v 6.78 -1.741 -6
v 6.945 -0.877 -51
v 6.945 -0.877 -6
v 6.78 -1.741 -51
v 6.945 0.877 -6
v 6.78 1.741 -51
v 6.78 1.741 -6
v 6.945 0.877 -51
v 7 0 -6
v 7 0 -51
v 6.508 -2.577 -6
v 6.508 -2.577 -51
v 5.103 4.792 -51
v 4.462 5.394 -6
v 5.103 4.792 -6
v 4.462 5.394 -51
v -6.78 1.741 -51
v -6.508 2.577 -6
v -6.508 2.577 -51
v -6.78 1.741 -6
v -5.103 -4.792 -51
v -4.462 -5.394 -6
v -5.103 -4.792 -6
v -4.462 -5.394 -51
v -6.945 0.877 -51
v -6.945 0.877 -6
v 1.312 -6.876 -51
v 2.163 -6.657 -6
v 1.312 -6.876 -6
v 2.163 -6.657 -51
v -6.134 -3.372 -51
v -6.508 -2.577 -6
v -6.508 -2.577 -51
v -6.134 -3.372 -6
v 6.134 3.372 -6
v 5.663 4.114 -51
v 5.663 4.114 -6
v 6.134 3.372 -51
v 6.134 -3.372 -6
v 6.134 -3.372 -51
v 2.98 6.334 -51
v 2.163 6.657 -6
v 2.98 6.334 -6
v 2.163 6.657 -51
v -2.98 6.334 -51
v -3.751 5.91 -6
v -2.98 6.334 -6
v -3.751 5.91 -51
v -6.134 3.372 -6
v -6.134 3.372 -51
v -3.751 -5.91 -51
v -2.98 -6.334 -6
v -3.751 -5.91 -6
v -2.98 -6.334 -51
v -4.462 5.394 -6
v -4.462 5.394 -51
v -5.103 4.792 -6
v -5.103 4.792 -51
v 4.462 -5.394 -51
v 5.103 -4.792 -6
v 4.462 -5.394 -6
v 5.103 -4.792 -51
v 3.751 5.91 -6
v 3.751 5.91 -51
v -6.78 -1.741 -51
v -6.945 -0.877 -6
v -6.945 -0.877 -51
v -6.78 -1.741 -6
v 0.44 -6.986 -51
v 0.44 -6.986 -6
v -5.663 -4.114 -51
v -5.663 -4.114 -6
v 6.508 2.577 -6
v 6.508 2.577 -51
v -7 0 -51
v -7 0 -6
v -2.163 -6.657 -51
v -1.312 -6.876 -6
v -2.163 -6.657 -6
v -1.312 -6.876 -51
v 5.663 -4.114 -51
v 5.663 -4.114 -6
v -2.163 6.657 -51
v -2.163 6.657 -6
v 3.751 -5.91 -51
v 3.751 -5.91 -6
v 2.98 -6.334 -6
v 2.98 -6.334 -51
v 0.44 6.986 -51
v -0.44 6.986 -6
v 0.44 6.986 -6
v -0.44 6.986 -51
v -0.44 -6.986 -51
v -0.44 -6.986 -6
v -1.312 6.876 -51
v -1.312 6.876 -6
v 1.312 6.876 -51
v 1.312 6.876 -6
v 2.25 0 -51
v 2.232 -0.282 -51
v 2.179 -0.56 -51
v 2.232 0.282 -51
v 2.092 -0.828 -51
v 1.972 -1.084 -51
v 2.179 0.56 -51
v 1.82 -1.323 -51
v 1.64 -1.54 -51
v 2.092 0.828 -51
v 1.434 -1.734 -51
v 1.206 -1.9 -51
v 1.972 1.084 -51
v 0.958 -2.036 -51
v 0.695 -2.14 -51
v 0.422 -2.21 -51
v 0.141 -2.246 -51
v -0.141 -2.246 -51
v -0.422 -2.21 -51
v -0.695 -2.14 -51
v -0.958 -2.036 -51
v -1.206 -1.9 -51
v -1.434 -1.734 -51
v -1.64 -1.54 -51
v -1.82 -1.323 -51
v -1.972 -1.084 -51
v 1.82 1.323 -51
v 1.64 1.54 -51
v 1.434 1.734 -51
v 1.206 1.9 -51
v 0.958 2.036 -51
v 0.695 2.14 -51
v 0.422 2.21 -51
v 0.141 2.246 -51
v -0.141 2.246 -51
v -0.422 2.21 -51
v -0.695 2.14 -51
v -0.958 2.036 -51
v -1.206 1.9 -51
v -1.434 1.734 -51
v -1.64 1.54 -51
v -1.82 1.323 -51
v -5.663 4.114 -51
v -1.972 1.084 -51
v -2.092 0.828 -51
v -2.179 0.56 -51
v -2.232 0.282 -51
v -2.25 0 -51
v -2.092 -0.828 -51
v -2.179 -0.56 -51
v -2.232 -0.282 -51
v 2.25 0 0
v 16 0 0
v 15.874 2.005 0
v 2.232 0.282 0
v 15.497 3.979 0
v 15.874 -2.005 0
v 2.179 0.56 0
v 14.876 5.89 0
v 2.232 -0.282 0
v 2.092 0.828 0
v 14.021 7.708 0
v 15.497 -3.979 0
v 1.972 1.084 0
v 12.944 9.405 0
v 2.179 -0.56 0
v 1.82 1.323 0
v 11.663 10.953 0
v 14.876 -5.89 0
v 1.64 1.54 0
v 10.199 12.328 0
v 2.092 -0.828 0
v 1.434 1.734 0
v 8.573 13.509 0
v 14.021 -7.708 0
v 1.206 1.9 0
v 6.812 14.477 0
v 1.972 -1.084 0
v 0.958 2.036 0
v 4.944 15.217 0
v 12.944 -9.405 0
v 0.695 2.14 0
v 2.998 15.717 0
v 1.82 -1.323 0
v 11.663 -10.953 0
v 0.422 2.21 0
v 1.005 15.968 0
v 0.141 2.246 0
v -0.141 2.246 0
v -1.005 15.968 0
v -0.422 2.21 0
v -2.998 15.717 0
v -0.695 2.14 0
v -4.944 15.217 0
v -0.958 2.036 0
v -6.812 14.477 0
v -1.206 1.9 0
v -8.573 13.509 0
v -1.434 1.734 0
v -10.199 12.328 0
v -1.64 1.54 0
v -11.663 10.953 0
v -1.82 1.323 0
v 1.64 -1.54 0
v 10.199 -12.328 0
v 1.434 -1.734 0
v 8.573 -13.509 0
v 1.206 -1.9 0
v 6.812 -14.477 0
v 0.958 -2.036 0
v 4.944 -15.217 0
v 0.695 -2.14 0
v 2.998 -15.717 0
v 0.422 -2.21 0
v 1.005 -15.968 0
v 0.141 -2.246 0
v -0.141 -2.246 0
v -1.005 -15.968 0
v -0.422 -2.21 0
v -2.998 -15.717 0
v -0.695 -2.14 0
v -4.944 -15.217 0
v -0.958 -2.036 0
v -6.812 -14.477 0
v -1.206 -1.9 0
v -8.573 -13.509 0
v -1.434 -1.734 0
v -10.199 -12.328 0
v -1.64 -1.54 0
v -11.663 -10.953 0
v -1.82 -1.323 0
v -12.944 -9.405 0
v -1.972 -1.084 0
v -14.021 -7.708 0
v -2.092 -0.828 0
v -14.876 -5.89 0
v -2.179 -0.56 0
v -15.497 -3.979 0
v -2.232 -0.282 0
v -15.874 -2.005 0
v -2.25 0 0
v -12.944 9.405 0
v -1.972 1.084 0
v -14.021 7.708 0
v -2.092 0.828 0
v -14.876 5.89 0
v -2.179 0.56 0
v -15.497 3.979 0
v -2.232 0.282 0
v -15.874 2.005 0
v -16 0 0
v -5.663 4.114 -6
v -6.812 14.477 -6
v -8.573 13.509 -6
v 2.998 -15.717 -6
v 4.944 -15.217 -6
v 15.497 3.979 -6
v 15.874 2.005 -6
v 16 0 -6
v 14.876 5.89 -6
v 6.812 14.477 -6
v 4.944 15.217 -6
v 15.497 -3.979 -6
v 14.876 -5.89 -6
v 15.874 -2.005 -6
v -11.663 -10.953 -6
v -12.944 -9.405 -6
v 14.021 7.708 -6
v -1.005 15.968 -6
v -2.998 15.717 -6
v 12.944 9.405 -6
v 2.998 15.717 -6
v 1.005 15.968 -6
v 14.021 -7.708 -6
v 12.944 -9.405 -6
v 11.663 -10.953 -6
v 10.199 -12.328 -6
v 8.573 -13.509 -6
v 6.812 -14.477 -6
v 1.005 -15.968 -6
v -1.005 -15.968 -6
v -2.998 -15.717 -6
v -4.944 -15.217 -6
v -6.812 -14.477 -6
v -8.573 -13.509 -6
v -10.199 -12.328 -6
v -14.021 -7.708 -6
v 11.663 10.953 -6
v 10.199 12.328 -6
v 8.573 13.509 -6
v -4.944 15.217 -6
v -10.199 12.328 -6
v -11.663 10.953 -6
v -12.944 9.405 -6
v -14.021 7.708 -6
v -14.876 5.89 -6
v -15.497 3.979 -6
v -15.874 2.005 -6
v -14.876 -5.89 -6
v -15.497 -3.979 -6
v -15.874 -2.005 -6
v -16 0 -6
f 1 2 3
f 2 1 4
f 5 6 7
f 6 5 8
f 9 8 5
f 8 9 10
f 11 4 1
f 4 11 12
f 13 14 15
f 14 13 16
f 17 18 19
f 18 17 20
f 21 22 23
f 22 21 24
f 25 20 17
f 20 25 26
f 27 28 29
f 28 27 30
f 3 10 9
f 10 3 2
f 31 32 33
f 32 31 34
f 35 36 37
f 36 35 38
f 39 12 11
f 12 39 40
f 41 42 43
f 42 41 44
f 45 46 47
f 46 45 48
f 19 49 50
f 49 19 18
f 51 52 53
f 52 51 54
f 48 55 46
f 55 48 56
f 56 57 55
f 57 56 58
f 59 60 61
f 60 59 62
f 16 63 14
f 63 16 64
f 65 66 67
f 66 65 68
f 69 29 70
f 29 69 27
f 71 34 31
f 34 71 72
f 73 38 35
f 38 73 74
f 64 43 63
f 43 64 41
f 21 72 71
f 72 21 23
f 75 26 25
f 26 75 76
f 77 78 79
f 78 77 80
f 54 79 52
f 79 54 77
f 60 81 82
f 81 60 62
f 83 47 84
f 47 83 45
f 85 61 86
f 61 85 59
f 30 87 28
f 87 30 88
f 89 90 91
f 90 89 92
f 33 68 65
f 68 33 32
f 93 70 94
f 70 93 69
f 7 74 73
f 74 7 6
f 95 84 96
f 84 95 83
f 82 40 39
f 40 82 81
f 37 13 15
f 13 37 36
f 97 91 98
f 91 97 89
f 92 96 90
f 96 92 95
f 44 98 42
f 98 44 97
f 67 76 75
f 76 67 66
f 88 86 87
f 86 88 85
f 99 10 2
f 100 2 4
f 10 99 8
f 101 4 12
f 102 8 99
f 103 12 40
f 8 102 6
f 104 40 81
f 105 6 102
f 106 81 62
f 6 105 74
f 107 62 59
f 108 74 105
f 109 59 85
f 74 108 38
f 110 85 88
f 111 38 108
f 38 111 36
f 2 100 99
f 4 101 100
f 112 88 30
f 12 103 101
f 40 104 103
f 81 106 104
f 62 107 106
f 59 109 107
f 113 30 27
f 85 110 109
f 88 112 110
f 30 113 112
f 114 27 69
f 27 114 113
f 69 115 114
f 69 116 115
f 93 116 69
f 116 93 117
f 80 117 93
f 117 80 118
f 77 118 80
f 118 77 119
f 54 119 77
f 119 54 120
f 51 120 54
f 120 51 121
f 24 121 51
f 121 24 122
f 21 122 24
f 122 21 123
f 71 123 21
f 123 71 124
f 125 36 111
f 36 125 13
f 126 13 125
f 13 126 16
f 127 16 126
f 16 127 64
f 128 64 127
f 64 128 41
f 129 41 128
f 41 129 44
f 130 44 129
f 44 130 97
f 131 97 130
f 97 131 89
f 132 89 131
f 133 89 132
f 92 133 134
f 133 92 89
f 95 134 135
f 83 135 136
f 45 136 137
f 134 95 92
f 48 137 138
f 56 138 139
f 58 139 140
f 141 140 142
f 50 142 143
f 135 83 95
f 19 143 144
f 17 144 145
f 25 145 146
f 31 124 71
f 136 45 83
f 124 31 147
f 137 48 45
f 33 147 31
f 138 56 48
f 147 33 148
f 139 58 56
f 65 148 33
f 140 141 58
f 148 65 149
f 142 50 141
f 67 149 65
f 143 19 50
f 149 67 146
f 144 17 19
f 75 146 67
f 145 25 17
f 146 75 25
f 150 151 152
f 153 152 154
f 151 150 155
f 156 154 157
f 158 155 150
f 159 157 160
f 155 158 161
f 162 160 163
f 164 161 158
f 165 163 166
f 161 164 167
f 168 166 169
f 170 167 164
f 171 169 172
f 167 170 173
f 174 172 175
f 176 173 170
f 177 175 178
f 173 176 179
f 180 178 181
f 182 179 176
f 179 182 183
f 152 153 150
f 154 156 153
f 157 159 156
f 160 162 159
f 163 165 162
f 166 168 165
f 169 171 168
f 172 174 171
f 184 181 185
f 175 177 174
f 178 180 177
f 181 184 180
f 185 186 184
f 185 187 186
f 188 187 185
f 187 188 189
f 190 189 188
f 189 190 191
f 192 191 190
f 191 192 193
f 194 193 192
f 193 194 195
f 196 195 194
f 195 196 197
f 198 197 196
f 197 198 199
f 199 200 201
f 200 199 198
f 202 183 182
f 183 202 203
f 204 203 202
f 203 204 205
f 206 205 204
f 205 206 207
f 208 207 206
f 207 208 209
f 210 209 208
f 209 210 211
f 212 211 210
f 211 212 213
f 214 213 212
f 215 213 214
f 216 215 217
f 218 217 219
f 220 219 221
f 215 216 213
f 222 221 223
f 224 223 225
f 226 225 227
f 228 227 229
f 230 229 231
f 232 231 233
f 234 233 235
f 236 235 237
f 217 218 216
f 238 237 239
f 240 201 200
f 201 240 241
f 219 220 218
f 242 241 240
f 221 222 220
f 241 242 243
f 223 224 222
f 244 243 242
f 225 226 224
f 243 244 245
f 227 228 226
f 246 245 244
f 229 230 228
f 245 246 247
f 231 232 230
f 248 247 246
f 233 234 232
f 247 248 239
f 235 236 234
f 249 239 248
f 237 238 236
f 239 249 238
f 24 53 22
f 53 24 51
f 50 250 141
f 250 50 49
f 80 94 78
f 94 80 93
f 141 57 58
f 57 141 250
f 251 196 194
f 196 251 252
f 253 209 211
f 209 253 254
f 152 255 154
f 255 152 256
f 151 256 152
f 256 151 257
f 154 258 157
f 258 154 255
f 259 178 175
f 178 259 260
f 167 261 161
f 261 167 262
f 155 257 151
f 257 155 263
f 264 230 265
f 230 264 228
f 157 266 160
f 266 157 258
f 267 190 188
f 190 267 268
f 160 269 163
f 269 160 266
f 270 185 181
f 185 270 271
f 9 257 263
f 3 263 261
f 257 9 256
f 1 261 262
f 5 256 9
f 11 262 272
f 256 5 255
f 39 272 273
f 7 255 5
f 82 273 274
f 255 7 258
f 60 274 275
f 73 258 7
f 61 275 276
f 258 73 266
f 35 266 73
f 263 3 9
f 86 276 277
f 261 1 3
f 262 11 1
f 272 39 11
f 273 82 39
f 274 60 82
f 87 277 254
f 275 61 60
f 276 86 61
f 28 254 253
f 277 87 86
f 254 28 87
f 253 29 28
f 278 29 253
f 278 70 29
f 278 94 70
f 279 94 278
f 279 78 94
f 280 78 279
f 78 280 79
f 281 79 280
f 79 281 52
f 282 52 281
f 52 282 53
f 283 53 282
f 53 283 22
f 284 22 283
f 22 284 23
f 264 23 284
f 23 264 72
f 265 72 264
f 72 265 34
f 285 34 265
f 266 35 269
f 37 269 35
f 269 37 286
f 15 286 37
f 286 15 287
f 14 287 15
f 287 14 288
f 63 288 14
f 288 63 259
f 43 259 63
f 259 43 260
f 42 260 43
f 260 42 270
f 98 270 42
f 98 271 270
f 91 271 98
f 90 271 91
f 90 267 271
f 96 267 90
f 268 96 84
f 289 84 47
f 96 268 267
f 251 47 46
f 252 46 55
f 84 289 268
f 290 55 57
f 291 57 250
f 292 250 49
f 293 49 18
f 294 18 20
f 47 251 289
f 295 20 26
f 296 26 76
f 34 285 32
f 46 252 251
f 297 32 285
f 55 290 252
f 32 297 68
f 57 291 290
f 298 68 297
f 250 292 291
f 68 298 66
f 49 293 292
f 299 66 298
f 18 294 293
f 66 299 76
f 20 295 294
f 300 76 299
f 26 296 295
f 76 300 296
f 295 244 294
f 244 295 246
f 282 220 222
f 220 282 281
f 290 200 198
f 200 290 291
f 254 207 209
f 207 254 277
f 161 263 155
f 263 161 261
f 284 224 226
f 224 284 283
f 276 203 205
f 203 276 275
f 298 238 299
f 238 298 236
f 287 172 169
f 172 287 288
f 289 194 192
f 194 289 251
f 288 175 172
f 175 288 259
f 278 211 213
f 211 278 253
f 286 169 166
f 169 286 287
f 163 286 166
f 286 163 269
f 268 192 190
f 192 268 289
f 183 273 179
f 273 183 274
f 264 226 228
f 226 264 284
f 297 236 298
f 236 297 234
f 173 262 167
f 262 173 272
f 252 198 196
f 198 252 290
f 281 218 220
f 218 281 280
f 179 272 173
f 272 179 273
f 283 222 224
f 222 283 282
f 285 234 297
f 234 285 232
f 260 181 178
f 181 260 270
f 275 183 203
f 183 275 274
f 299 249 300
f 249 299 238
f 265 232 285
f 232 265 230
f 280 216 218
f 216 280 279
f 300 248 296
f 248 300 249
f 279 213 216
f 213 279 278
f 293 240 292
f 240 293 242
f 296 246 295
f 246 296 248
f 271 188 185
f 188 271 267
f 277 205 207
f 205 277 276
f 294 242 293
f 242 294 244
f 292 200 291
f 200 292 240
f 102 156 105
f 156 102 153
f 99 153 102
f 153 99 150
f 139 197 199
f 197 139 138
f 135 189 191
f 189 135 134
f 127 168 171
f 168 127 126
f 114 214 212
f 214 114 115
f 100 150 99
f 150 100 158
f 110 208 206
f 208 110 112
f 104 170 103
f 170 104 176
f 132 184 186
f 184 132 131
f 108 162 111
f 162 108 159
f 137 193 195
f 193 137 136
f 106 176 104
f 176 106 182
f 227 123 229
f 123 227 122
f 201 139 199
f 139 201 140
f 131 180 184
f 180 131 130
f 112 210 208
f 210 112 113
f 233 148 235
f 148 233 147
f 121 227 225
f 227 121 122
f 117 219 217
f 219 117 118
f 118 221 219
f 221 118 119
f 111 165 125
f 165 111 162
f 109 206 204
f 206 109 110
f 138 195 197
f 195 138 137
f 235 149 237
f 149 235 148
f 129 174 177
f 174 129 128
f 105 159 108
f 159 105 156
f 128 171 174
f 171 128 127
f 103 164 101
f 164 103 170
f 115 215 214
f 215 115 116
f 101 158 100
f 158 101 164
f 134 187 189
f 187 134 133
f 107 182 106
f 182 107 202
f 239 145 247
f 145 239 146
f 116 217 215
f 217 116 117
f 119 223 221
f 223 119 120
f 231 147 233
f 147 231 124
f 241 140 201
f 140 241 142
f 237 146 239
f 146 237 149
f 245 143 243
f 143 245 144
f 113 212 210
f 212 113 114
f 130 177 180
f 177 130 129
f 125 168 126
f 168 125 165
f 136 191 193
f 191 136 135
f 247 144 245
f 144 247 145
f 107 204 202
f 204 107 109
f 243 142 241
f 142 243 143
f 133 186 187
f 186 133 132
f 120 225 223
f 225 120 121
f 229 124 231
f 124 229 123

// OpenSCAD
$fn = 50;


difference() {
	union() {
		translate(v = [0, 0, -51.0000000000]) {
			cylinder(h = 51, r = 7.0000000000);
		}
		translate(v = [0, 0, -6.0000000000]) {
			cylinder(h = 6, r = 16.0000000000);
		}
	}
	union() {
		#translate(v = [0, 0, -51]) {
			cylinder(h = 51, r = 2.2500000000);
		}
	}
}
